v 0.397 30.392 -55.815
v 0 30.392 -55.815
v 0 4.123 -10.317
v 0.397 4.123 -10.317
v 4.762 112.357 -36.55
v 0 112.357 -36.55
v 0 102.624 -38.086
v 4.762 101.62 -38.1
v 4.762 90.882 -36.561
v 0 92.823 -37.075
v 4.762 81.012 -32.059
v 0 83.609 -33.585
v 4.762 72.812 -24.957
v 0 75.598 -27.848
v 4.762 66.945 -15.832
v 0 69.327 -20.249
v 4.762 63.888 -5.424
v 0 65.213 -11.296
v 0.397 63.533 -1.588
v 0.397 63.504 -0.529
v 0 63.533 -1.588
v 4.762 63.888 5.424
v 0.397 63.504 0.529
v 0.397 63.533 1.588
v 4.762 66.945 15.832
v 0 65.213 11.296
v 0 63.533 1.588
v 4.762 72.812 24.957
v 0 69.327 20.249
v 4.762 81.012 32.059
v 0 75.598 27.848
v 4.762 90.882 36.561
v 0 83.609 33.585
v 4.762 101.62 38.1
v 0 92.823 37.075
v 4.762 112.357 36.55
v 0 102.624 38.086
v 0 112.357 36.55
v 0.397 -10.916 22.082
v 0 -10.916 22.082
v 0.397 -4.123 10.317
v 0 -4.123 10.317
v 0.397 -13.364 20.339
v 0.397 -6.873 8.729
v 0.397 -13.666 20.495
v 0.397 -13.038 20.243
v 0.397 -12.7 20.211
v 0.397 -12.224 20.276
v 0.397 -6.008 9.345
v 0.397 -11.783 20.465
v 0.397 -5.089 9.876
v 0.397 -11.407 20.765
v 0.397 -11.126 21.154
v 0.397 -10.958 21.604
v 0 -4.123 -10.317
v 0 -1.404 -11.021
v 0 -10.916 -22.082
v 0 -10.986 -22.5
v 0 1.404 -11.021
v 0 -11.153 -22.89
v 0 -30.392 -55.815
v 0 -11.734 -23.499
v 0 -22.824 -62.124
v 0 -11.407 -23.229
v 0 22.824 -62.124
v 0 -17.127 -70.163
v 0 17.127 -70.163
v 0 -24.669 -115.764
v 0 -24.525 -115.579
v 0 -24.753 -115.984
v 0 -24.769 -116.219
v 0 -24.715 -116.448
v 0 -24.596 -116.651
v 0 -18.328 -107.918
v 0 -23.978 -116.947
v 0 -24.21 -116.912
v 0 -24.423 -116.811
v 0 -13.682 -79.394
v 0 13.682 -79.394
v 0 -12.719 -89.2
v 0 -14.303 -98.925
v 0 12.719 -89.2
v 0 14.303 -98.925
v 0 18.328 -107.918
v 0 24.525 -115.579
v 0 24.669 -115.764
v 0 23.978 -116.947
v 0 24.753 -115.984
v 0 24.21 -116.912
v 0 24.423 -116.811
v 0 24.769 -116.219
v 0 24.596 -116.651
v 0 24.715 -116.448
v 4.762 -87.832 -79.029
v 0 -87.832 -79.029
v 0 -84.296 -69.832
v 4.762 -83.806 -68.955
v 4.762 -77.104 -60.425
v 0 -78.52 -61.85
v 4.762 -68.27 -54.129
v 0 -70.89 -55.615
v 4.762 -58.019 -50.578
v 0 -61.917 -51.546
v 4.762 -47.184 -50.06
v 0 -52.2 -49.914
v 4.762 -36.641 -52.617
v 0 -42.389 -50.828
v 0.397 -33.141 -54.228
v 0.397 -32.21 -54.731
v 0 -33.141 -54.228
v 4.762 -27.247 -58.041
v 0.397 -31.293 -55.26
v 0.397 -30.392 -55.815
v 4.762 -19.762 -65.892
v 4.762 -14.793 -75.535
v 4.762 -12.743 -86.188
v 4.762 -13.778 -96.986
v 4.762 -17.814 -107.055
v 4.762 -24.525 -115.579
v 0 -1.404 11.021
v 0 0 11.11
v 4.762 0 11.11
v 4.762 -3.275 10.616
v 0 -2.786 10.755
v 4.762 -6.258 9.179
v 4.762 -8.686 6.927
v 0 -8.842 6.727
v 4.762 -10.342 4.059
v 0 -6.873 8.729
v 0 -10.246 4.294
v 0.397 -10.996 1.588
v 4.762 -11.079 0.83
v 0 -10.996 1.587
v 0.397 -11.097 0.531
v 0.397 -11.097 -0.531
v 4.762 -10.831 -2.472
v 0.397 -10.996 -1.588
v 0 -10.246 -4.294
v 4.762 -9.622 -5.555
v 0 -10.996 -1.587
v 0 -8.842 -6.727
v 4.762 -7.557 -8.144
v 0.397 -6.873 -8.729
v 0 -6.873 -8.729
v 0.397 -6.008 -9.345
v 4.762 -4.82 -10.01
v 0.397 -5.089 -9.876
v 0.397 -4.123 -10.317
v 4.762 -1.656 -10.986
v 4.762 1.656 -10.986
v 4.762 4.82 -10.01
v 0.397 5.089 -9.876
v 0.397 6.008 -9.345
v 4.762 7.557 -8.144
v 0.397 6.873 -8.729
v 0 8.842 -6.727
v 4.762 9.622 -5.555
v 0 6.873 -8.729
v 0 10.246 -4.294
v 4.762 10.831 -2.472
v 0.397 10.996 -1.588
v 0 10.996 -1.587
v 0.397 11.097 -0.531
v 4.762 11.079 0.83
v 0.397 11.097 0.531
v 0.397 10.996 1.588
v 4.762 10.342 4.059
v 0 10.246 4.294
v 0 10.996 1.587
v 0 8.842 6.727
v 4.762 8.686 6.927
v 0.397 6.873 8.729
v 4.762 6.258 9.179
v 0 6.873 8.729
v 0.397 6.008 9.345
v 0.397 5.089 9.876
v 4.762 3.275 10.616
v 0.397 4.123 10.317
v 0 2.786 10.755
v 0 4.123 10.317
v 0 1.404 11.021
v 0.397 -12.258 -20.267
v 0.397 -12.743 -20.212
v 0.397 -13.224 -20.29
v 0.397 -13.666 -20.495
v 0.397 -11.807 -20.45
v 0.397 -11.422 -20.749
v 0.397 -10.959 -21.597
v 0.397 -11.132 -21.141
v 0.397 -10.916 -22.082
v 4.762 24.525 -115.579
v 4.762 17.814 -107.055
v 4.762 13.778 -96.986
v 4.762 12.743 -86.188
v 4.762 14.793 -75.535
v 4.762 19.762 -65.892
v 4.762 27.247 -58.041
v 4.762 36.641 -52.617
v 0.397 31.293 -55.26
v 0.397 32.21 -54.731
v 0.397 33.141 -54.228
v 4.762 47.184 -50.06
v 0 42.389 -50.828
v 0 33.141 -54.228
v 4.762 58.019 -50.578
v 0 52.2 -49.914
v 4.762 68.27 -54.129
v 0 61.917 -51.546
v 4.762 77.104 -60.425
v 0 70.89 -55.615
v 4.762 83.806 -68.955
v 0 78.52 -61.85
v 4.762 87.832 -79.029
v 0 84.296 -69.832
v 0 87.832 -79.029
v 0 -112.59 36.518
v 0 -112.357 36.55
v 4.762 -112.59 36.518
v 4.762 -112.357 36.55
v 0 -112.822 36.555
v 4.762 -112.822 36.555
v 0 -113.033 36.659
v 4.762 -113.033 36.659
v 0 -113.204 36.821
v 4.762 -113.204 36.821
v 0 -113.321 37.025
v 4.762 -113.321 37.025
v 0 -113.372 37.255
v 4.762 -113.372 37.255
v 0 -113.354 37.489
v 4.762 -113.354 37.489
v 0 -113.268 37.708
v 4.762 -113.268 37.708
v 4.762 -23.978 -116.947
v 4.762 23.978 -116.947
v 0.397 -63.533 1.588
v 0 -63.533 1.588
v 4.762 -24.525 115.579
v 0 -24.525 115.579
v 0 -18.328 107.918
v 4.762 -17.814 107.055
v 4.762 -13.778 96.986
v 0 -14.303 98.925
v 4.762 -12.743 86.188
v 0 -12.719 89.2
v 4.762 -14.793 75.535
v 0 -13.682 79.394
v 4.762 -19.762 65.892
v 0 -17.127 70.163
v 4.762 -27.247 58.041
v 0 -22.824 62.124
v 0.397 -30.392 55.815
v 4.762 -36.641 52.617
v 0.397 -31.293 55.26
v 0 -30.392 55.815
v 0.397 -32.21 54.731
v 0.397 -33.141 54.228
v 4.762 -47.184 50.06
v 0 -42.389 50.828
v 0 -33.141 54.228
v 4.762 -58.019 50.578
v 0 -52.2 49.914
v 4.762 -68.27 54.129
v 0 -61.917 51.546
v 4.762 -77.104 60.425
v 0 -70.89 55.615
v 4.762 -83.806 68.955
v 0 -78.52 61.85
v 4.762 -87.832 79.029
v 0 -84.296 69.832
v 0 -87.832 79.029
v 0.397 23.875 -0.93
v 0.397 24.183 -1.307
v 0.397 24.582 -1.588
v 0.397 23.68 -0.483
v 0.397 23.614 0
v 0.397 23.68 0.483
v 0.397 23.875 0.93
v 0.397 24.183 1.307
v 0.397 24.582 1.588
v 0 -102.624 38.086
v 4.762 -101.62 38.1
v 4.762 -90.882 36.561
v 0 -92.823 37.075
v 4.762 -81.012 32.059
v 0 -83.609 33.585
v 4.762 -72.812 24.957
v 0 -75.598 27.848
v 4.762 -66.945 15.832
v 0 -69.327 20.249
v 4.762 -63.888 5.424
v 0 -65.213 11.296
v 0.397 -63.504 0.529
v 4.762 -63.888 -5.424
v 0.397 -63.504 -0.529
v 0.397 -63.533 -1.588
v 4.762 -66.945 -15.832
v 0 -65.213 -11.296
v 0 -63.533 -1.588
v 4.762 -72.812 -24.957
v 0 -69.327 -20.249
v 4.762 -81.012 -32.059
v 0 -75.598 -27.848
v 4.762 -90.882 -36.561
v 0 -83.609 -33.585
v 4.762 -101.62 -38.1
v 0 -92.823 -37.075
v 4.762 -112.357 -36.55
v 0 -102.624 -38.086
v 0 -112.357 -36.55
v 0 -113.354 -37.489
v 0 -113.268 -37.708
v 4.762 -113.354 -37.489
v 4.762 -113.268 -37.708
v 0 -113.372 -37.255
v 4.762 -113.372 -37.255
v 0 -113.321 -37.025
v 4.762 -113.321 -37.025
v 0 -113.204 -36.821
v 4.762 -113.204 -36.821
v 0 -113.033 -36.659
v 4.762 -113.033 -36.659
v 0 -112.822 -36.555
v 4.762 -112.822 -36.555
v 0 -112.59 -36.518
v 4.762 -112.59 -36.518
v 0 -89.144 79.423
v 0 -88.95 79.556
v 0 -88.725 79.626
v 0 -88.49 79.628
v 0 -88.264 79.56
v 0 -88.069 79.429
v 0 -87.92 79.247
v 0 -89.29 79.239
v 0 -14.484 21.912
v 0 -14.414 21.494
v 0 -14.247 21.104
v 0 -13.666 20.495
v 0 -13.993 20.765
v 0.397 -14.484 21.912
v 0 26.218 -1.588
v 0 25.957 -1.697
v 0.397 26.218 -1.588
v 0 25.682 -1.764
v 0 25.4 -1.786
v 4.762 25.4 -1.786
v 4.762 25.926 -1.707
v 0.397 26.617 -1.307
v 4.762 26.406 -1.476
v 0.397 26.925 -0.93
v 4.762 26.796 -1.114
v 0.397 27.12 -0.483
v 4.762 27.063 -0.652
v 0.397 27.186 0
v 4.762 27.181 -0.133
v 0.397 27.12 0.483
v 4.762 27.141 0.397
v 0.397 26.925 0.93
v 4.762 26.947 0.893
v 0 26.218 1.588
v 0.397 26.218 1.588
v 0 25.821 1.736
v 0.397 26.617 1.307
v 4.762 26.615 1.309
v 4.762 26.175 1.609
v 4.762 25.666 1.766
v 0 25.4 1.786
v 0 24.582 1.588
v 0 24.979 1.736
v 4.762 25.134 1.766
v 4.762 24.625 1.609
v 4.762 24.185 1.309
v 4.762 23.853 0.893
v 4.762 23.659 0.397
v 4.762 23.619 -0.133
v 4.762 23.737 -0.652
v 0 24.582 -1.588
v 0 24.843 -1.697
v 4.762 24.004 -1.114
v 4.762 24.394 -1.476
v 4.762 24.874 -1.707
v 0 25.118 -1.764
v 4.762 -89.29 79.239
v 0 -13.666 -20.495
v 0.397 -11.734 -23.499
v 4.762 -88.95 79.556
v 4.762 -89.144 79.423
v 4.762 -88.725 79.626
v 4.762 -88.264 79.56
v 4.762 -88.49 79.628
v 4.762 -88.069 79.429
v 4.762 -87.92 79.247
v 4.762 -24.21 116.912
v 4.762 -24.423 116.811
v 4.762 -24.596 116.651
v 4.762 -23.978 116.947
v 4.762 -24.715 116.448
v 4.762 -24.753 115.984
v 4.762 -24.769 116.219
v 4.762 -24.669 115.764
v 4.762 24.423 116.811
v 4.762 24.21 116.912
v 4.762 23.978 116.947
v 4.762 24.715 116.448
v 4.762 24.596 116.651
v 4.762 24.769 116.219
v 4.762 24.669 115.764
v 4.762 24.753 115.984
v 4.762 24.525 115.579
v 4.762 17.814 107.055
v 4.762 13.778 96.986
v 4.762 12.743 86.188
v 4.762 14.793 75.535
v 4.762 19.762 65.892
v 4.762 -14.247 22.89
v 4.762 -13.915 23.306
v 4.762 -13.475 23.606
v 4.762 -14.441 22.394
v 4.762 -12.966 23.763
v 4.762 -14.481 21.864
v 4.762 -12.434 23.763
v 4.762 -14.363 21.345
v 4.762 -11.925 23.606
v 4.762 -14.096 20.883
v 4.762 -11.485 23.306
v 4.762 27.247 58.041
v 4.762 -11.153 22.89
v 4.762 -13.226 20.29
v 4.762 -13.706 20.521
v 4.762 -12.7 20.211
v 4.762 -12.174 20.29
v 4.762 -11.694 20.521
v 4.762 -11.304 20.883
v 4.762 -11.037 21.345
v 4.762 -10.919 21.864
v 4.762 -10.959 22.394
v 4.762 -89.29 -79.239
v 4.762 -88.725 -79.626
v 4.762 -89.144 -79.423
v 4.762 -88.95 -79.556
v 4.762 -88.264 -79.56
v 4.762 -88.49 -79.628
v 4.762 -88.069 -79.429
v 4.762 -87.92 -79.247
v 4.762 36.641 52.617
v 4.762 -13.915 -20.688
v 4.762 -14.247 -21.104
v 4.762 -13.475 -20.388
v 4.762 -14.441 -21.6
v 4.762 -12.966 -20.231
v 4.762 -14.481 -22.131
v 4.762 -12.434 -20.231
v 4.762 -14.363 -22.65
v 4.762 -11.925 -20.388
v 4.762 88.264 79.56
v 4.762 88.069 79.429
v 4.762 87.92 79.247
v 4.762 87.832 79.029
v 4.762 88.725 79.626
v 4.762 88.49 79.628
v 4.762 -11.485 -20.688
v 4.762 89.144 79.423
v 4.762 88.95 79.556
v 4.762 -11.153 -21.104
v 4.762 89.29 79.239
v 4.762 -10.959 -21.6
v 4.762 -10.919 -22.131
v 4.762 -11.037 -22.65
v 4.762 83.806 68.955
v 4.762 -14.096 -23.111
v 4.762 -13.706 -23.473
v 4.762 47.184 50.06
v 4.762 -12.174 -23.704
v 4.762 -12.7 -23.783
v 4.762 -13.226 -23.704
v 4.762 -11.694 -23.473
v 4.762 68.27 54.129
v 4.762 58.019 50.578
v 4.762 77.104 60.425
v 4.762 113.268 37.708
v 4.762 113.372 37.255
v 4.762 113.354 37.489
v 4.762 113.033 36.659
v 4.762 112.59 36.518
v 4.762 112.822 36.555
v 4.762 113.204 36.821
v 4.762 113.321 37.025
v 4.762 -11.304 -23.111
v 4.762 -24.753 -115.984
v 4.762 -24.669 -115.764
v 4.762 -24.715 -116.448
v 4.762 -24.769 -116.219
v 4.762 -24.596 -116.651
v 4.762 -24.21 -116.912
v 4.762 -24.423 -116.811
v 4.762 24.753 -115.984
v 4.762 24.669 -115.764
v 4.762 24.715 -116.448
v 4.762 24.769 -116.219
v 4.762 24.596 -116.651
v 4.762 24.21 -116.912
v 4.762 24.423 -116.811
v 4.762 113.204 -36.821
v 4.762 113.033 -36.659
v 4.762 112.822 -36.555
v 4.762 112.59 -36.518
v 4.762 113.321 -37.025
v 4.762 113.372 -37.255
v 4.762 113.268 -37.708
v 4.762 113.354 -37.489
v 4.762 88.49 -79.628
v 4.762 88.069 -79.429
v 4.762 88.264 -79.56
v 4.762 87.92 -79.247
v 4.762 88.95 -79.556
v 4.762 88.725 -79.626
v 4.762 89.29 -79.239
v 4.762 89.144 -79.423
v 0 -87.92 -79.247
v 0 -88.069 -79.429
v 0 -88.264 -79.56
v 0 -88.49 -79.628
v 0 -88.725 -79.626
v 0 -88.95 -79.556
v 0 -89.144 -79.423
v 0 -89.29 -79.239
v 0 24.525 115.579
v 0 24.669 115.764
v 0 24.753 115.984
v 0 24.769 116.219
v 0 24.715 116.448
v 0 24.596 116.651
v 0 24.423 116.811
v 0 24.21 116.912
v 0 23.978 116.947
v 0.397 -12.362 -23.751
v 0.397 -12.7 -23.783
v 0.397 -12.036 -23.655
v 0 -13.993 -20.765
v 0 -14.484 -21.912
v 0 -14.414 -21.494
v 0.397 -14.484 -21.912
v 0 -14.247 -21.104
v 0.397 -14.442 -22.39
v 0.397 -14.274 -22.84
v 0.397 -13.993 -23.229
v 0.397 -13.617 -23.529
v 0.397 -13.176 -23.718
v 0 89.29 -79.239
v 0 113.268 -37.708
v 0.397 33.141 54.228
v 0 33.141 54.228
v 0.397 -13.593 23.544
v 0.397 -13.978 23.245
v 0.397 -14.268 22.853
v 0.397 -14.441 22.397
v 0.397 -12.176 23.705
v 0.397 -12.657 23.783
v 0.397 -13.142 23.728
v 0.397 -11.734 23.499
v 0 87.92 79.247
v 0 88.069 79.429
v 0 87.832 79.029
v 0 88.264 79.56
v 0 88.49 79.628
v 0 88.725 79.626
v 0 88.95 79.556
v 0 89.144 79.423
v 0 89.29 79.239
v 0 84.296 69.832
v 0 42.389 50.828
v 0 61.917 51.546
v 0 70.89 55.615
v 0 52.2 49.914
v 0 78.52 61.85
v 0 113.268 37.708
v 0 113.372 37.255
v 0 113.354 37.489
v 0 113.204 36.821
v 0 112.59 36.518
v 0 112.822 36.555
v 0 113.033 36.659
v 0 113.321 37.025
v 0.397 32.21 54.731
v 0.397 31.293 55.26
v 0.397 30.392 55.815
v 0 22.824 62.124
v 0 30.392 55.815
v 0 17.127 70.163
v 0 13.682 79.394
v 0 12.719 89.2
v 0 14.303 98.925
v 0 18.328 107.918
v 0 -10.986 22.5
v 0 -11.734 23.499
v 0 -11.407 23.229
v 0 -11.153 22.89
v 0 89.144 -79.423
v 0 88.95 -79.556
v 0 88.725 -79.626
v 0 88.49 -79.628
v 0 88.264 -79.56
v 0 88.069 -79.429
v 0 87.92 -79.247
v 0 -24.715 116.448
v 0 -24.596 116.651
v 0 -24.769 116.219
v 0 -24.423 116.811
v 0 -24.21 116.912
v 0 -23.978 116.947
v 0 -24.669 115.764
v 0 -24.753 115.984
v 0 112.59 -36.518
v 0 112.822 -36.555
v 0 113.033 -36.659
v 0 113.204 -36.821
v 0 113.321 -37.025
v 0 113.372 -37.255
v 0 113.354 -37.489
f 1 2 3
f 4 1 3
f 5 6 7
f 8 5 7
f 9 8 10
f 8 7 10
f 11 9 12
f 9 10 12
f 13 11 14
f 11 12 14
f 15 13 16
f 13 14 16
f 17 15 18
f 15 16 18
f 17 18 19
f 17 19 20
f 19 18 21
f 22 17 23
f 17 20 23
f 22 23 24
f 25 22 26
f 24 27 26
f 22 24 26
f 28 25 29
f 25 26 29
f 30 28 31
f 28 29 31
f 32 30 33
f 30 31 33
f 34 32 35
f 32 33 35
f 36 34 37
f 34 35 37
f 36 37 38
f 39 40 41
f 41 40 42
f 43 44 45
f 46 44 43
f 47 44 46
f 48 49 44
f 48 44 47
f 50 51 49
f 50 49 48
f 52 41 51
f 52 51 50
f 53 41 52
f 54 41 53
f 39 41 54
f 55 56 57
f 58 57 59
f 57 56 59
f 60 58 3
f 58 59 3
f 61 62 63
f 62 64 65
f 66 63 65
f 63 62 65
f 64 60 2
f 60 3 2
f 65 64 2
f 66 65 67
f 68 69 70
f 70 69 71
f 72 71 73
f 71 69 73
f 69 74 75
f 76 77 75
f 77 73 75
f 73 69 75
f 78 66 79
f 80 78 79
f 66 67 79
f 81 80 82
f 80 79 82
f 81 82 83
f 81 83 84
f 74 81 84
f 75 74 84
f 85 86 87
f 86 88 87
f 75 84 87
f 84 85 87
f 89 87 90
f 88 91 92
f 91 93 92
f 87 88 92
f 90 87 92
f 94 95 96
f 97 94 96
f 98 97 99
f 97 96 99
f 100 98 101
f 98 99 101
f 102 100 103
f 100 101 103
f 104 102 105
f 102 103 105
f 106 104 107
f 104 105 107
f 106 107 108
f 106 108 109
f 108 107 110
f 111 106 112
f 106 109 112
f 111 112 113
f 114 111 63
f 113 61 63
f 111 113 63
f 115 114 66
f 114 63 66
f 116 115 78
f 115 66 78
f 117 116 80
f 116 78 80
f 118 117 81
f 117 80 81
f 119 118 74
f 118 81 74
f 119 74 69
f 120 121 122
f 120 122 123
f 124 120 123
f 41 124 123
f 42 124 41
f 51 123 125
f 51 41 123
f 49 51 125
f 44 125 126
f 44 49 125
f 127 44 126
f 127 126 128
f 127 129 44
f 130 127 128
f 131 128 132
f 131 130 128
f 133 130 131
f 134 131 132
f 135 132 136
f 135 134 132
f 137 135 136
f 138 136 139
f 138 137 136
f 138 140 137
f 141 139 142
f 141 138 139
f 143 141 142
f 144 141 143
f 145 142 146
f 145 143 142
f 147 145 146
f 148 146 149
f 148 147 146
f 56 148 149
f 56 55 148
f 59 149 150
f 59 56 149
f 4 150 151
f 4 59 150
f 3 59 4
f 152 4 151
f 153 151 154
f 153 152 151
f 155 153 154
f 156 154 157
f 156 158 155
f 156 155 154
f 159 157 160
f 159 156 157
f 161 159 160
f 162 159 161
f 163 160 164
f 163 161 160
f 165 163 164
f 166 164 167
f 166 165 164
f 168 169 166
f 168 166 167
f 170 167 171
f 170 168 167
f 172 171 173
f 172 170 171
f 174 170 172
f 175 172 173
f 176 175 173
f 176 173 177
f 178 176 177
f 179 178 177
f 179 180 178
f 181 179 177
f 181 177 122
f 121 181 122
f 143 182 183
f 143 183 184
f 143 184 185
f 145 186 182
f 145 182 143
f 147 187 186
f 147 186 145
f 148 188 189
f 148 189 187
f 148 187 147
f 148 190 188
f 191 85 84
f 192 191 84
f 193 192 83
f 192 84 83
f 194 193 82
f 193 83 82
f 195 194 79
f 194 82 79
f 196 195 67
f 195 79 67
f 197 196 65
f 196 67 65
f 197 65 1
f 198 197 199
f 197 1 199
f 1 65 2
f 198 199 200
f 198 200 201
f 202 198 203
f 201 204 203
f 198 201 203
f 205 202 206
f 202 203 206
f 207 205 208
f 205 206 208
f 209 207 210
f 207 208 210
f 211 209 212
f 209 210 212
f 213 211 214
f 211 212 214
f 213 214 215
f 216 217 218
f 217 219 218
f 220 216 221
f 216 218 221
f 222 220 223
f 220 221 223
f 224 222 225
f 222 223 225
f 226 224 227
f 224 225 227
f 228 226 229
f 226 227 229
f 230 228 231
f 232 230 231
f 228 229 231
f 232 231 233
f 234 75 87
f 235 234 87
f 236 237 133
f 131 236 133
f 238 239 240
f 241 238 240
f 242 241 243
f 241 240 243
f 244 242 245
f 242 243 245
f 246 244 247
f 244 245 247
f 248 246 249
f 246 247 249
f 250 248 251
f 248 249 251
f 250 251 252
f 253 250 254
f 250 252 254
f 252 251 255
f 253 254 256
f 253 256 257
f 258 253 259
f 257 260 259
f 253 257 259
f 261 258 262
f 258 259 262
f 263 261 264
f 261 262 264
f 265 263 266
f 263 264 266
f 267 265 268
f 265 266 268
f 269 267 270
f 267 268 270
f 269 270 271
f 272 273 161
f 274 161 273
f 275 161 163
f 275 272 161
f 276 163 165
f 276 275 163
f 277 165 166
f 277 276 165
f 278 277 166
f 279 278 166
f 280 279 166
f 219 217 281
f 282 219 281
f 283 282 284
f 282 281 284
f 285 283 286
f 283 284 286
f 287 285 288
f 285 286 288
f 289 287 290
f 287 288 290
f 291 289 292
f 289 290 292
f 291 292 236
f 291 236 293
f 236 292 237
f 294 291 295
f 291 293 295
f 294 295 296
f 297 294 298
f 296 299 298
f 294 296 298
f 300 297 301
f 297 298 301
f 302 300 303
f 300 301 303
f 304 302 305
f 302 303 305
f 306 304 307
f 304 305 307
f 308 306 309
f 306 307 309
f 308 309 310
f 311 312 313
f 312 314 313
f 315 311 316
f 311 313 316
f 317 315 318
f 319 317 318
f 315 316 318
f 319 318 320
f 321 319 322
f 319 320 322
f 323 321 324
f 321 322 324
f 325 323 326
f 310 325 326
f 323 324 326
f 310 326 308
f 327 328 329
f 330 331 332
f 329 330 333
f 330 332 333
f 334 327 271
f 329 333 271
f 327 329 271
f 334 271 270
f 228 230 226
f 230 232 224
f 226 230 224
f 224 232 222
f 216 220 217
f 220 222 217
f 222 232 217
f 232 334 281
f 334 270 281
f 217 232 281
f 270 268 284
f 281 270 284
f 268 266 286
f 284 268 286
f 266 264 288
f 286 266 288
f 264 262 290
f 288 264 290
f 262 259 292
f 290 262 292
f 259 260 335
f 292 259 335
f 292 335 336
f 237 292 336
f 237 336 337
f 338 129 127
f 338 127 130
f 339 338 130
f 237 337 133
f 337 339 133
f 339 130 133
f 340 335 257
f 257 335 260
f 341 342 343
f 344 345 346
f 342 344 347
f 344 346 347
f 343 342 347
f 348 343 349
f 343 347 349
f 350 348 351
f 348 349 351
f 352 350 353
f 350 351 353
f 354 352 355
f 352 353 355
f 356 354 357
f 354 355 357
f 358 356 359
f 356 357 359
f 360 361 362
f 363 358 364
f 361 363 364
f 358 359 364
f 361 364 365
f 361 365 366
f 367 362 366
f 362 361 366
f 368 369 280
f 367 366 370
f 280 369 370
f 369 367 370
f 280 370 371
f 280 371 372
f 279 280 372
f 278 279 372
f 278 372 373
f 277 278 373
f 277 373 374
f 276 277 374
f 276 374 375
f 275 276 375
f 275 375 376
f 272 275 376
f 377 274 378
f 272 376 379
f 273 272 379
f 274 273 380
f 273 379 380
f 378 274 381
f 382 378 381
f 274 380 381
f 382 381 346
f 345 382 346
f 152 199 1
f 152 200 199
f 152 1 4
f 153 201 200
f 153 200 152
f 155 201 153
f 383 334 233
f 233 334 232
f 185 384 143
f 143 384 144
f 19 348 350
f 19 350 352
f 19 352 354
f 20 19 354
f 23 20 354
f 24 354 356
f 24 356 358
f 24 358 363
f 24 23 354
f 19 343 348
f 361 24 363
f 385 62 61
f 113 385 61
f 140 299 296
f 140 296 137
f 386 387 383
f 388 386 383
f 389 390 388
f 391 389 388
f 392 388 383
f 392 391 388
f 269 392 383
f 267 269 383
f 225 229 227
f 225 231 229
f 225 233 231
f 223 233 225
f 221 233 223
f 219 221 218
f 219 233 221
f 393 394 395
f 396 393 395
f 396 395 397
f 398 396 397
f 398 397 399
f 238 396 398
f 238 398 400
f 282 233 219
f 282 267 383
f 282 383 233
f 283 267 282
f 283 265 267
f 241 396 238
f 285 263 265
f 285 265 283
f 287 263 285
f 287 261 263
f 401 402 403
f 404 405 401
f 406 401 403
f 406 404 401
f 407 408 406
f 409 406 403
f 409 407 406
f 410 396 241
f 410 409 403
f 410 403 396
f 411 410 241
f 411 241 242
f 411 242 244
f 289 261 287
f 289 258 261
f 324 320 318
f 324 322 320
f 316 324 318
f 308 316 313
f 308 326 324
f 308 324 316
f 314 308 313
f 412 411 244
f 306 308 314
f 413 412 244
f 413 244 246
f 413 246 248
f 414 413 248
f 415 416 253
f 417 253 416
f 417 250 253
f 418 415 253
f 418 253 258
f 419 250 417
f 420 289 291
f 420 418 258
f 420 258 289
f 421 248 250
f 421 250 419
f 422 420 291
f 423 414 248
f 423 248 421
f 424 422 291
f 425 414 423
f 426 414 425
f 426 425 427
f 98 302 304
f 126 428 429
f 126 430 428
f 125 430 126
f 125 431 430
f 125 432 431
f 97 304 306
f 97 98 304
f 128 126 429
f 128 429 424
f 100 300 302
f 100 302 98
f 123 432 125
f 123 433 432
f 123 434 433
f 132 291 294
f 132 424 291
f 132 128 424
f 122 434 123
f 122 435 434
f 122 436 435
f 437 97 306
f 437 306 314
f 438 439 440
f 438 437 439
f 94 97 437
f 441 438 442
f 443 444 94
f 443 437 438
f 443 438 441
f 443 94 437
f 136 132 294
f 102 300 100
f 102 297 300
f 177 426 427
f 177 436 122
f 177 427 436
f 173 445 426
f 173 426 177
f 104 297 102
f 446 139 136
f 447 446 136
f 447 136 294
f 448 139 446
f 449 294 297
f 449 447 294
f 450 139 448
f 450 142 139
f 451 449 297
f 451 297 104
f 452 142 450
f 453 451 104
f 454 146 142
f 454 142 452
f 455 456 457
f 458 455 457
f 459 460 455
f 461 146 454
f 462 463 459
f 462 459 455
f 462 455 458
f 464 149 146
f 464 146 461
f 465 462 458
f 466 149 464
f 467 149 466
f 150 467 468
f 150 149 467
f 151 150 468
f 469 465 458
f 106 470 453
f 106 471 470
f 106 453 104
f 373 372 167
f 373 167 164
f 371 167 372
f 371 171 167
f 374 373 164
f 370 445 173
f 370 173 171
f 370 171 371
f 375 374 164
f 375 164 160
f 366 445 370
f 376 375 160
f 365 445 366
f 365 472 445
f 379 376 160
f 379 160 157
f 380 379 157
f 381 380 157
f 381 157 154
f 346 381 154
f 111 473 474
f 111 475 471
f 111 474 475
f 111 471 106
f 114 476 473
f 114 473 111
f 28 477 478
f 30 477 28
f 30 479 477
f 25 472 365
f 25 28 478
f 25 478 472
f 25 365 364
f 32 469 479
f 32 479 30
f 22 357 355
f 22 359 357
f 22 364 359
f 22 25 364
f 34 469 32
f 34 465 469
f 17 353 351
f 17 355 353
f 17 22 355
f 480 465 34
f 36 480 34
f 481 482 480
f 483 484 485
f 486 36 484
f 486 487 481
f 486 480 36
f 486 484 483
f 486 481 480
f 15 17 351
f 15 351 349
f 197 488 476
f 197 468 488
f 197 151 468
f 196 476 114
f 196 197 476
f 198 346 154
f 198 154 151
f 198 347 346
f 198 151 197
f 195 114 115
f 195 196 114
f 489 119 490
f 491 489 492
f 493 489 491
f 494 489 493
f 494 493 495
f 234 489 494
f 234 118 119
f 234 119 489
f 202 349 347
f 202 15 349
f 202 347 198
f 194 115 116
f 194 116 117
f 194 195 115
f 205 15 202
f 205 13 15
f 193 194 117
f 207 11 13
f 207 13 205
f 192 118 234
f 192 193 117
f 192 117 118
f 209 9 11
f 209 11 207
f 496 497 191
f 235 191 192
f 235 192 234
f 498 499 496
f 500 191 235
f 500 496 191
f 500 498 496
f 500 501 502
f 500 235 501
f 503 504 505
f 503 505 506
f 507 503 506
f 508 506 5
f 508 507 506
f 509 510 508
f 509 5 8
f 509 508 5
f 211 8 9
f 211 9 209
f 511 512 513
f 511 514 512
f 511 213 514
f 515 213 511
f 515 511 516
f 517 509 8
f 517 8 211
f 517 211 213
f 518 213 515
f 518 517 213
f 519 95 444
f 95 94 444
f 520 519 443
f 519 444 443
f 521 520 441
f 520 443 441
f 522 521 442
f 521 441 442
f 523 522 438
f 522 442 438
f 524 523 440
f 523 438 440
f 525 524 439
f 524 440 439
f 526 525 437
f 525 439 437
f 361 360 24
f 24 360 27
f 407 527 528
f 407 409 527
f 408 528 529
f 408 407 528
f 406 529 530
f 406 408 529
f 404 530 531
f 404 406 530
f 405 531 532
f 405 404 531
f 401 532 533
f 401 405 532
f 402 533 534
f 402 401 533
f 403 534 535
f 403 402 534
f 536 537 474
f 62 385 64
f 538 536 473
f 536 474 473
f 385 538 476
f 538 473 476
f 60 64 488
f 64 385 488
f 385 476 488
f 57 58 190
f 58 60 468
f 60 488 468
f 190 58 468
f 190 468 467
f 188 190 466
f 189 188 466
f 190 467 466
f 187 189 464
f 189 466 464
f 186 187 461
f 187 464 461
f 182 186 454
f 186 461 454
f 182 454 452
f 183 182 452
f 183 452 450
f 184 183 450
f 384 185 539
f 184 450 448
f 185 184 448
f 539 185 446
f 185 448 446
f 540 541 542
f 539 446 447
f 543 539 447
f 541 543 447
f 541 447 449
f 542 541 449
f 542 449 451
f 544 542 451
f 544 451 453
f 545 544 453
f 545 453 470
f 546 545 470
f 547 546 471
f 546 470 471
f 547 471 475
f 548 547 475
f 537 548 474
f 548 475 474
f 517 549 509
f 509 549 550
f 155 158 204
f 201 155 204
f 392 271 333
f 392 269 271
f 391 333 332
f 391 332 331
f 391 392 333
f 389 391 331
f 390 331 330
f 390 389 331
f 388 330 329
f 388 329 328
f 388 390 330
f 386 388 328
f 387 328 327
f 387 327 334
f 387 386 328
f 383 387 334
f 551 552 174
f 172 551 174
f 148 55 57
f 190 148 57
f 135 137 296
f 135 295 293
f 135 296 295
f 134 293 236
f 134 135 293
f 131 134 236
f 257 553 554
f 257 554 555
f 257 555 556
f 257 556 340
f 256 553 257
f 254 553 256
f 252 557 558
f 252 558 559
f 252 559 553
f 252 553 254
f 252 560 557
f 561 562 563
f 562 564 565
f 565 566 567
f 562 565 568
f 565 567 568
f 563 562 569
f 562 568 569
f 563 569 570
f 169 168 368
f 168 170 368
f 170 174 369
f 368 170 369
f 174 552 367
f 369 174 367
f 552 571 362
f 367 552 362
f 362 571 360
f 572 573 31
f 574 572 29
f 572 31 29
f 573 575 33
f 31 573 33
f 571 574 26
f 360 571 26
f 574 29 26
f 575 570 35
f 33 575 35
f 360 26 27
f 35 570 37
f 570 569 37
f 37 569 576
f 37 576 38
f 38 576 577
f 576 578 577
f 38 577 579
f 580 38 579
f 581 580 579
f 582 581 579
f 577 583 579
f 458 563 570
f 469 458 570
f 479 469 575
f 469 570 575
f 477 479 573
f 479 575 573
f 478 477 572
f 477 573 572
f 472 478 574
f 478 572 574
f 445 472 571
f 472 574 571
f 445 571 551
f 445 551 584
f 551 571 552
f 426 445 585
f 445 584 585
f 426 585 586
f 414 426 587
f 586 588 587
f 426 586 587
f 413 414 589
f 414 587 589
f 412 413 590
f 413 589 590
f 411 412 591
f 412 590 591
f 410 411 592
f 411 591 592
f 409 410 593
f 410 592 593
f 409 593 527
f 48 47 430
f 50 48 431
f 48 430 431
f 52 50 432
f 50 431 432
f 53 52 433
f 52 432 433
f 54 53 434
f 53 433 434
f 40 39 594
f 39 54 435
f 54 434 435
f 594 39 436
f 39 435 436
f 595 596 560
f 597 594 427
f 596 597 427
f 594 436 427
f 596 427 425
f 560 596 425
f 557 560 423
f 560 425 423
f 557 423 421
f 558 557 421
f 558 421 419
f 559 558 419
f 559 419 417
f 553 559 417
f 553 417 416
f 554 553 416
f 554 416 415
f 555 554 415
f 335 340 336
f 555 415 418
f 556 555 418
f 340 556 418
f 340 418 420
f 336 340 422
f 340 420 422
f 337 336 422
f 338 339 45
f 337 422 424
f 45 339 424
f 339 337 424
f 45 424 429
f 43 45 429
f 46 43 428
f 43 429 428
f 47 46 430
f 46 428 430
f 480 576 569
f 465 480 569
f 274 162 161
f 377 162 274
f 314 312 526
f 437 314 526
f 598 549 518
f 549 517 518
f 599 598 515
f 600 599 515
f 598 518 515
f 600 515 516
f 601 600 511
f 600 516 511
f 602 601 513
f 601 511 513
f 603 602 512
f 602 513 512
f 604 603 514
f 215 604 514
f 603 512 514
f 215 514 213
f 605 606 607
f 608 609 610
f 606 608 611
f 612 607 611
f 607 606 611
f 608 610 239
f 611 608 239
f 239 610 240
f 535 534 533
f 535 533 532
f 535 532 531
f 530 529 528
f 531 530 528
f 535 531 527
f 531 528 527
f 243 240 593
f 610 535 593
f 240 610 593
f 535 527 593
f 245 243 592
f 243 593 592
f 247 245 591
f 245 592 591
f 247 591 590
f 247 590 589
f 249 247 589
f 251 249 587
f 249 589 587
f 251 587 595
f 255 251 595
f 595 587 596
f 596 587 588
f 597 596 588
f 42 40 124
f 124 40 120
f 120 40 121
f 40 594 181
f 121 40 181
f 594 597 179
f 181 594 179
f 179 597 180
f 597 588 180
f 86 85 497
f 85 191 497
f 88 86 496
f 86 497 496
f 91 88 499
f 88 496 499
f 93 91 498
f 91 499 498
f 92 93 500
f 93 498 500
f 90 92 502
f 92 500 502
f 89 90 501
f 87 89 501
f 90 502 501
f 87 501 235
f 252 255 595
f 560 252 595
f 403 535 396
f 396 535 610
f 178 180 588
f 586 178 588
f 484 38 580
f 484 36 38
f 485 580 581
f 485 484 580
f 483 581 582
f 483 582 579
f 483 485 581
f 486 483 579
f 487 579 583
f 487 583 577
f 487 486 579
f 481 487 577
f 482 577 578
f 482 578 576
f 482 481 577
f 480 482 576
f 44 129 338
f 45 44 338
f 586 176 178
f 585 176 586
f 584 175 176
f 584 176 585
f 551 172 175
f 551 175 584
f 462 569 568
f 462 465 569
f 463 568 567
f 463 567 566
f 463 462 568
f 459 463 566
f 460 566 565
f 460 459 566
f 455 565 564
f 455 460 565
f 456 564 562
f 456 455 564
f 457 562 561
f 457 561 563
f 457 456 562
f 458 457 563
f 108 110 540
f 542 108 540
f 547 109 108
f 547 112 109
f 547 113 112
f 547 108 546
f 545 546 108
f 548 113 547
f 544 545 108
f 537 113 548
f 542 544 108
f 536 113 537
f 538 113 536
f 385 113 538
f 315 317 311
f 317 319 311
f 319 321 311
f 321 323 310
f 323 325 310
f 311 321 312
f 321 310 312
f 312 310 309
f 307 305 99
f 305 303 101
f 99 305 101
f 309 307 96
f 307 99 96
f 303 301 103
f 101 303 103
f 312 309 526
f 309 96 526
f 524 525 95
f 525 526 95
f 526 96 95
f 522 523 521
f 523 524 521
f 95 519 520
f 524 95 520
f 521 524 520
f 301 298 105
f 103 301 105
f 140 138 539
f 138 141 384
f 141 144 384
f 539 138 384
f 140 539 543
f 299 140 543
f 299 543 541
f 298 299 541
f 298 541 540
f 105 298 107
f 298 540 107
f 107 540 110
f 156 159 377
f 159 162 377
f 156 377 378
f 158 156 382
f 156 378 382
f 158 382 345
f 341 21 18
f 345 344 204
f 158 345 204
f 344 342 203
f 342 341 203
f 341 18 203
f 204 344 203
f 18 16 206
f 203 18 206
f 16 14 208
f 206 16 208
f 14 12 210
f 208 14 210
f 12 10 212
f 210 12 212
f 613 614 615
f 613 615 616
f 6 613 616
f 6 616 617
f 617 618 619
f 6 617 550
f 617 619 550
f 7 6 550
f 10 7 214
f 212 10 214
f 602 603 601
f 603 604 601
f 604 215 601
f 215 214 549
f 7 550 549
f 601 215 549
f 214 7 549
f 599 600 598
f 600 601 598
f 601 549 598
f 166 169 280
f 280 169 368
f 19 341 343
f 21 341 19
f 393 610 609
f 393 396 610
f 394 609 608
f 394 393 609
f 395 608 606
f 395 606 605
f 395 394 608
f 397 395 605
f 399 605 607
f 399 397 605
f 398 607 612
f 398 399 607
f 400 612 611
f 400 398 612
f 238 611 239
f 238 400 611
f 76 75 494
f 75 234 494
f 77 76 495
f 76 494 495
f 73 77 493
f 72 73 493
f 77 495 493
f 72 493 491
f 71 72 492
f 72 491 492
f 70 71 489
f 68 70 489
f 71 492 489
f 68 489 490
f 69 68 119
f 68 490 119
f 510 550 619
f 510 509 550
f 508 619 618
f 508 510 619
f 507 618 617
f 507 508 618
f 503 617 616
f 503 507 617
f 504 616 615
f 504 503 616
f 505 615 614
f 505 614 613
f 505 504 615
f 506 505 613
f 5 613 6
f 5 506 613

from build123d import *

# Parameters (mm, degrees)
SKETCH2_R                       = 11.10996
BOSS_EXTRUDE1_DEPTH             = 4.7625
SKETCH3_W                       = 3.175
SKETCH3_H                       = 181.991160274
CUT_EXTRUDE1_DEPTH              = 0.396875
FILLET1_R                       = 0.79375
F_9_64_0_14063_DIAMETER_HOLE1_D = 3.572002


with BuildPart() as part:
    # Sketch2 → Boss-Extrude1 (new body)
    with BuildSketch(Plane(origin=(0, 0, 0), x_dir=(0, 0, -1), z_dir=(1, 0, 0))):
        with BuildLine():
            Line((81.02619141, 88.258519733), (35.921024484, 114.3))
            ThreePointArc((35.921024484, 114.3), (0, 63.5), (-35.921024484, 114.3))
            Line((-35.921024484, 114.3), (-81.02619141, 88.258519733))
            ThreePointArc((-81.02619141, 88.258519733), (-54.99261314, 31.75), (-116.947215895, 26.041480267))
            Line((-116.947215895, 26.041480267), (-116.947215895, -26.041480267))
            ThreePointArc((-116.947215895, -26.041480267), (-54.99261314, -31.75), (-81.02619141, -88.258519733))
            Line((-81.02619141, -88.258519733), (-35.921024484, -114.3))
            ThreePointArc((-35.921024484, -114.3), (0, -63.5), (35.921024484, -114.3))
            Line((35.921024484, -114.3), (81.02619141, -88.258519733))
            ThreePointArc((81.02619141, -88.258519733), (54.99261314, -31.75), (116.947215895, -26.041480267))
            Line((116.947215895, -26.041480267), (116.947215895, 26.041480267))
            ThreePointArc((116.947215895, 26.041480267), (54.99261314, 31.75), (81.02619141, 88.258519733))
        make_face()
        with Locations(Location((0, 0, 0), (0, 0, 180))):
            Circle(SKETCH2_R, mode=Mode.SUBTRACT)
    extrude(amount=BOSS_EXTRUDE1_DEPTH)

    # Sketch3 → Cut-Extrude1 (cut)
    with BuildSketch(Plane.ZY):
        with Locations((0, 101.6)):
            Rectangle(SKETCH3_W, SKETCH3_H)
        Polygon((167.586415056, 94.92297474), (165.998915056, 97.672605397), (8.389946993, 6.67702526), (9.977446993, 3.927394603), align=None)
        Polygon((165.998915056, -97.672605397), (167.586415056, -94.92297474), (9.977446993, -3.927394603), (8.389946993, -6.67702526), align=None)
        with Locations((0, -101.6)):
            Rectangle(SKETCH3_W, SKETCH3_H)
        Polygon((-167.586415056, -94.92297474), (-165.998915056, -97.672605397), (-8.389946993, -6.67702526), (-9.977446993, -3.927394603), align=None)
        Polygon((-165.998915056, 97.672605397), (-167.586415056, 94.92297474), (-9.977446993, 3.927394603), (-8.389946993, 6.67702526), align=None)
    extrude(amount=-CUT_EXTRUDE1_DEPTH, mode=Mode.SUBTRACT)

    # Fillet1
    fillet1_edges = [part.edges().sort_by_distance(p)[0] for p in [
        (2.38125, 88.258519733, 81.02619141),
        (2.38125, 114.3, 35.921024484),
        (2.38125, 114.3, -35.921024484),
        (2.38125, 88.258519733, -81.02619141),
        (2.38125, 26.041480267, -116.947215895),
        (2.38125, -26.041480267, -116.947215895),
        (2.38125, -88.258519733, -81.02619141),
        (2.38125, -114.3, -35.921024484),
        (2.38125, -114.3, 35.921024484),
        (2.38125, -88.258519733, 81.02619141),
        (2.38125, -26.041480267, 116.947215895),
        (2.38125, 26.041480267, 116.947215895),
    ]]
    fillet(fillet1_edges, radius=FILLET1_R)

    # 9/64 (0.14063) Diameter Hole1 (through all)
    with Locations(Plane.ZY):
        with Locations((0, 25.4), (21.997045256, -12.7), (-21.997045256, -12.7)):
            Hole(F_9_64_0_14063_DIAMETER_HOLE1_D / 2)


solid = part.part
